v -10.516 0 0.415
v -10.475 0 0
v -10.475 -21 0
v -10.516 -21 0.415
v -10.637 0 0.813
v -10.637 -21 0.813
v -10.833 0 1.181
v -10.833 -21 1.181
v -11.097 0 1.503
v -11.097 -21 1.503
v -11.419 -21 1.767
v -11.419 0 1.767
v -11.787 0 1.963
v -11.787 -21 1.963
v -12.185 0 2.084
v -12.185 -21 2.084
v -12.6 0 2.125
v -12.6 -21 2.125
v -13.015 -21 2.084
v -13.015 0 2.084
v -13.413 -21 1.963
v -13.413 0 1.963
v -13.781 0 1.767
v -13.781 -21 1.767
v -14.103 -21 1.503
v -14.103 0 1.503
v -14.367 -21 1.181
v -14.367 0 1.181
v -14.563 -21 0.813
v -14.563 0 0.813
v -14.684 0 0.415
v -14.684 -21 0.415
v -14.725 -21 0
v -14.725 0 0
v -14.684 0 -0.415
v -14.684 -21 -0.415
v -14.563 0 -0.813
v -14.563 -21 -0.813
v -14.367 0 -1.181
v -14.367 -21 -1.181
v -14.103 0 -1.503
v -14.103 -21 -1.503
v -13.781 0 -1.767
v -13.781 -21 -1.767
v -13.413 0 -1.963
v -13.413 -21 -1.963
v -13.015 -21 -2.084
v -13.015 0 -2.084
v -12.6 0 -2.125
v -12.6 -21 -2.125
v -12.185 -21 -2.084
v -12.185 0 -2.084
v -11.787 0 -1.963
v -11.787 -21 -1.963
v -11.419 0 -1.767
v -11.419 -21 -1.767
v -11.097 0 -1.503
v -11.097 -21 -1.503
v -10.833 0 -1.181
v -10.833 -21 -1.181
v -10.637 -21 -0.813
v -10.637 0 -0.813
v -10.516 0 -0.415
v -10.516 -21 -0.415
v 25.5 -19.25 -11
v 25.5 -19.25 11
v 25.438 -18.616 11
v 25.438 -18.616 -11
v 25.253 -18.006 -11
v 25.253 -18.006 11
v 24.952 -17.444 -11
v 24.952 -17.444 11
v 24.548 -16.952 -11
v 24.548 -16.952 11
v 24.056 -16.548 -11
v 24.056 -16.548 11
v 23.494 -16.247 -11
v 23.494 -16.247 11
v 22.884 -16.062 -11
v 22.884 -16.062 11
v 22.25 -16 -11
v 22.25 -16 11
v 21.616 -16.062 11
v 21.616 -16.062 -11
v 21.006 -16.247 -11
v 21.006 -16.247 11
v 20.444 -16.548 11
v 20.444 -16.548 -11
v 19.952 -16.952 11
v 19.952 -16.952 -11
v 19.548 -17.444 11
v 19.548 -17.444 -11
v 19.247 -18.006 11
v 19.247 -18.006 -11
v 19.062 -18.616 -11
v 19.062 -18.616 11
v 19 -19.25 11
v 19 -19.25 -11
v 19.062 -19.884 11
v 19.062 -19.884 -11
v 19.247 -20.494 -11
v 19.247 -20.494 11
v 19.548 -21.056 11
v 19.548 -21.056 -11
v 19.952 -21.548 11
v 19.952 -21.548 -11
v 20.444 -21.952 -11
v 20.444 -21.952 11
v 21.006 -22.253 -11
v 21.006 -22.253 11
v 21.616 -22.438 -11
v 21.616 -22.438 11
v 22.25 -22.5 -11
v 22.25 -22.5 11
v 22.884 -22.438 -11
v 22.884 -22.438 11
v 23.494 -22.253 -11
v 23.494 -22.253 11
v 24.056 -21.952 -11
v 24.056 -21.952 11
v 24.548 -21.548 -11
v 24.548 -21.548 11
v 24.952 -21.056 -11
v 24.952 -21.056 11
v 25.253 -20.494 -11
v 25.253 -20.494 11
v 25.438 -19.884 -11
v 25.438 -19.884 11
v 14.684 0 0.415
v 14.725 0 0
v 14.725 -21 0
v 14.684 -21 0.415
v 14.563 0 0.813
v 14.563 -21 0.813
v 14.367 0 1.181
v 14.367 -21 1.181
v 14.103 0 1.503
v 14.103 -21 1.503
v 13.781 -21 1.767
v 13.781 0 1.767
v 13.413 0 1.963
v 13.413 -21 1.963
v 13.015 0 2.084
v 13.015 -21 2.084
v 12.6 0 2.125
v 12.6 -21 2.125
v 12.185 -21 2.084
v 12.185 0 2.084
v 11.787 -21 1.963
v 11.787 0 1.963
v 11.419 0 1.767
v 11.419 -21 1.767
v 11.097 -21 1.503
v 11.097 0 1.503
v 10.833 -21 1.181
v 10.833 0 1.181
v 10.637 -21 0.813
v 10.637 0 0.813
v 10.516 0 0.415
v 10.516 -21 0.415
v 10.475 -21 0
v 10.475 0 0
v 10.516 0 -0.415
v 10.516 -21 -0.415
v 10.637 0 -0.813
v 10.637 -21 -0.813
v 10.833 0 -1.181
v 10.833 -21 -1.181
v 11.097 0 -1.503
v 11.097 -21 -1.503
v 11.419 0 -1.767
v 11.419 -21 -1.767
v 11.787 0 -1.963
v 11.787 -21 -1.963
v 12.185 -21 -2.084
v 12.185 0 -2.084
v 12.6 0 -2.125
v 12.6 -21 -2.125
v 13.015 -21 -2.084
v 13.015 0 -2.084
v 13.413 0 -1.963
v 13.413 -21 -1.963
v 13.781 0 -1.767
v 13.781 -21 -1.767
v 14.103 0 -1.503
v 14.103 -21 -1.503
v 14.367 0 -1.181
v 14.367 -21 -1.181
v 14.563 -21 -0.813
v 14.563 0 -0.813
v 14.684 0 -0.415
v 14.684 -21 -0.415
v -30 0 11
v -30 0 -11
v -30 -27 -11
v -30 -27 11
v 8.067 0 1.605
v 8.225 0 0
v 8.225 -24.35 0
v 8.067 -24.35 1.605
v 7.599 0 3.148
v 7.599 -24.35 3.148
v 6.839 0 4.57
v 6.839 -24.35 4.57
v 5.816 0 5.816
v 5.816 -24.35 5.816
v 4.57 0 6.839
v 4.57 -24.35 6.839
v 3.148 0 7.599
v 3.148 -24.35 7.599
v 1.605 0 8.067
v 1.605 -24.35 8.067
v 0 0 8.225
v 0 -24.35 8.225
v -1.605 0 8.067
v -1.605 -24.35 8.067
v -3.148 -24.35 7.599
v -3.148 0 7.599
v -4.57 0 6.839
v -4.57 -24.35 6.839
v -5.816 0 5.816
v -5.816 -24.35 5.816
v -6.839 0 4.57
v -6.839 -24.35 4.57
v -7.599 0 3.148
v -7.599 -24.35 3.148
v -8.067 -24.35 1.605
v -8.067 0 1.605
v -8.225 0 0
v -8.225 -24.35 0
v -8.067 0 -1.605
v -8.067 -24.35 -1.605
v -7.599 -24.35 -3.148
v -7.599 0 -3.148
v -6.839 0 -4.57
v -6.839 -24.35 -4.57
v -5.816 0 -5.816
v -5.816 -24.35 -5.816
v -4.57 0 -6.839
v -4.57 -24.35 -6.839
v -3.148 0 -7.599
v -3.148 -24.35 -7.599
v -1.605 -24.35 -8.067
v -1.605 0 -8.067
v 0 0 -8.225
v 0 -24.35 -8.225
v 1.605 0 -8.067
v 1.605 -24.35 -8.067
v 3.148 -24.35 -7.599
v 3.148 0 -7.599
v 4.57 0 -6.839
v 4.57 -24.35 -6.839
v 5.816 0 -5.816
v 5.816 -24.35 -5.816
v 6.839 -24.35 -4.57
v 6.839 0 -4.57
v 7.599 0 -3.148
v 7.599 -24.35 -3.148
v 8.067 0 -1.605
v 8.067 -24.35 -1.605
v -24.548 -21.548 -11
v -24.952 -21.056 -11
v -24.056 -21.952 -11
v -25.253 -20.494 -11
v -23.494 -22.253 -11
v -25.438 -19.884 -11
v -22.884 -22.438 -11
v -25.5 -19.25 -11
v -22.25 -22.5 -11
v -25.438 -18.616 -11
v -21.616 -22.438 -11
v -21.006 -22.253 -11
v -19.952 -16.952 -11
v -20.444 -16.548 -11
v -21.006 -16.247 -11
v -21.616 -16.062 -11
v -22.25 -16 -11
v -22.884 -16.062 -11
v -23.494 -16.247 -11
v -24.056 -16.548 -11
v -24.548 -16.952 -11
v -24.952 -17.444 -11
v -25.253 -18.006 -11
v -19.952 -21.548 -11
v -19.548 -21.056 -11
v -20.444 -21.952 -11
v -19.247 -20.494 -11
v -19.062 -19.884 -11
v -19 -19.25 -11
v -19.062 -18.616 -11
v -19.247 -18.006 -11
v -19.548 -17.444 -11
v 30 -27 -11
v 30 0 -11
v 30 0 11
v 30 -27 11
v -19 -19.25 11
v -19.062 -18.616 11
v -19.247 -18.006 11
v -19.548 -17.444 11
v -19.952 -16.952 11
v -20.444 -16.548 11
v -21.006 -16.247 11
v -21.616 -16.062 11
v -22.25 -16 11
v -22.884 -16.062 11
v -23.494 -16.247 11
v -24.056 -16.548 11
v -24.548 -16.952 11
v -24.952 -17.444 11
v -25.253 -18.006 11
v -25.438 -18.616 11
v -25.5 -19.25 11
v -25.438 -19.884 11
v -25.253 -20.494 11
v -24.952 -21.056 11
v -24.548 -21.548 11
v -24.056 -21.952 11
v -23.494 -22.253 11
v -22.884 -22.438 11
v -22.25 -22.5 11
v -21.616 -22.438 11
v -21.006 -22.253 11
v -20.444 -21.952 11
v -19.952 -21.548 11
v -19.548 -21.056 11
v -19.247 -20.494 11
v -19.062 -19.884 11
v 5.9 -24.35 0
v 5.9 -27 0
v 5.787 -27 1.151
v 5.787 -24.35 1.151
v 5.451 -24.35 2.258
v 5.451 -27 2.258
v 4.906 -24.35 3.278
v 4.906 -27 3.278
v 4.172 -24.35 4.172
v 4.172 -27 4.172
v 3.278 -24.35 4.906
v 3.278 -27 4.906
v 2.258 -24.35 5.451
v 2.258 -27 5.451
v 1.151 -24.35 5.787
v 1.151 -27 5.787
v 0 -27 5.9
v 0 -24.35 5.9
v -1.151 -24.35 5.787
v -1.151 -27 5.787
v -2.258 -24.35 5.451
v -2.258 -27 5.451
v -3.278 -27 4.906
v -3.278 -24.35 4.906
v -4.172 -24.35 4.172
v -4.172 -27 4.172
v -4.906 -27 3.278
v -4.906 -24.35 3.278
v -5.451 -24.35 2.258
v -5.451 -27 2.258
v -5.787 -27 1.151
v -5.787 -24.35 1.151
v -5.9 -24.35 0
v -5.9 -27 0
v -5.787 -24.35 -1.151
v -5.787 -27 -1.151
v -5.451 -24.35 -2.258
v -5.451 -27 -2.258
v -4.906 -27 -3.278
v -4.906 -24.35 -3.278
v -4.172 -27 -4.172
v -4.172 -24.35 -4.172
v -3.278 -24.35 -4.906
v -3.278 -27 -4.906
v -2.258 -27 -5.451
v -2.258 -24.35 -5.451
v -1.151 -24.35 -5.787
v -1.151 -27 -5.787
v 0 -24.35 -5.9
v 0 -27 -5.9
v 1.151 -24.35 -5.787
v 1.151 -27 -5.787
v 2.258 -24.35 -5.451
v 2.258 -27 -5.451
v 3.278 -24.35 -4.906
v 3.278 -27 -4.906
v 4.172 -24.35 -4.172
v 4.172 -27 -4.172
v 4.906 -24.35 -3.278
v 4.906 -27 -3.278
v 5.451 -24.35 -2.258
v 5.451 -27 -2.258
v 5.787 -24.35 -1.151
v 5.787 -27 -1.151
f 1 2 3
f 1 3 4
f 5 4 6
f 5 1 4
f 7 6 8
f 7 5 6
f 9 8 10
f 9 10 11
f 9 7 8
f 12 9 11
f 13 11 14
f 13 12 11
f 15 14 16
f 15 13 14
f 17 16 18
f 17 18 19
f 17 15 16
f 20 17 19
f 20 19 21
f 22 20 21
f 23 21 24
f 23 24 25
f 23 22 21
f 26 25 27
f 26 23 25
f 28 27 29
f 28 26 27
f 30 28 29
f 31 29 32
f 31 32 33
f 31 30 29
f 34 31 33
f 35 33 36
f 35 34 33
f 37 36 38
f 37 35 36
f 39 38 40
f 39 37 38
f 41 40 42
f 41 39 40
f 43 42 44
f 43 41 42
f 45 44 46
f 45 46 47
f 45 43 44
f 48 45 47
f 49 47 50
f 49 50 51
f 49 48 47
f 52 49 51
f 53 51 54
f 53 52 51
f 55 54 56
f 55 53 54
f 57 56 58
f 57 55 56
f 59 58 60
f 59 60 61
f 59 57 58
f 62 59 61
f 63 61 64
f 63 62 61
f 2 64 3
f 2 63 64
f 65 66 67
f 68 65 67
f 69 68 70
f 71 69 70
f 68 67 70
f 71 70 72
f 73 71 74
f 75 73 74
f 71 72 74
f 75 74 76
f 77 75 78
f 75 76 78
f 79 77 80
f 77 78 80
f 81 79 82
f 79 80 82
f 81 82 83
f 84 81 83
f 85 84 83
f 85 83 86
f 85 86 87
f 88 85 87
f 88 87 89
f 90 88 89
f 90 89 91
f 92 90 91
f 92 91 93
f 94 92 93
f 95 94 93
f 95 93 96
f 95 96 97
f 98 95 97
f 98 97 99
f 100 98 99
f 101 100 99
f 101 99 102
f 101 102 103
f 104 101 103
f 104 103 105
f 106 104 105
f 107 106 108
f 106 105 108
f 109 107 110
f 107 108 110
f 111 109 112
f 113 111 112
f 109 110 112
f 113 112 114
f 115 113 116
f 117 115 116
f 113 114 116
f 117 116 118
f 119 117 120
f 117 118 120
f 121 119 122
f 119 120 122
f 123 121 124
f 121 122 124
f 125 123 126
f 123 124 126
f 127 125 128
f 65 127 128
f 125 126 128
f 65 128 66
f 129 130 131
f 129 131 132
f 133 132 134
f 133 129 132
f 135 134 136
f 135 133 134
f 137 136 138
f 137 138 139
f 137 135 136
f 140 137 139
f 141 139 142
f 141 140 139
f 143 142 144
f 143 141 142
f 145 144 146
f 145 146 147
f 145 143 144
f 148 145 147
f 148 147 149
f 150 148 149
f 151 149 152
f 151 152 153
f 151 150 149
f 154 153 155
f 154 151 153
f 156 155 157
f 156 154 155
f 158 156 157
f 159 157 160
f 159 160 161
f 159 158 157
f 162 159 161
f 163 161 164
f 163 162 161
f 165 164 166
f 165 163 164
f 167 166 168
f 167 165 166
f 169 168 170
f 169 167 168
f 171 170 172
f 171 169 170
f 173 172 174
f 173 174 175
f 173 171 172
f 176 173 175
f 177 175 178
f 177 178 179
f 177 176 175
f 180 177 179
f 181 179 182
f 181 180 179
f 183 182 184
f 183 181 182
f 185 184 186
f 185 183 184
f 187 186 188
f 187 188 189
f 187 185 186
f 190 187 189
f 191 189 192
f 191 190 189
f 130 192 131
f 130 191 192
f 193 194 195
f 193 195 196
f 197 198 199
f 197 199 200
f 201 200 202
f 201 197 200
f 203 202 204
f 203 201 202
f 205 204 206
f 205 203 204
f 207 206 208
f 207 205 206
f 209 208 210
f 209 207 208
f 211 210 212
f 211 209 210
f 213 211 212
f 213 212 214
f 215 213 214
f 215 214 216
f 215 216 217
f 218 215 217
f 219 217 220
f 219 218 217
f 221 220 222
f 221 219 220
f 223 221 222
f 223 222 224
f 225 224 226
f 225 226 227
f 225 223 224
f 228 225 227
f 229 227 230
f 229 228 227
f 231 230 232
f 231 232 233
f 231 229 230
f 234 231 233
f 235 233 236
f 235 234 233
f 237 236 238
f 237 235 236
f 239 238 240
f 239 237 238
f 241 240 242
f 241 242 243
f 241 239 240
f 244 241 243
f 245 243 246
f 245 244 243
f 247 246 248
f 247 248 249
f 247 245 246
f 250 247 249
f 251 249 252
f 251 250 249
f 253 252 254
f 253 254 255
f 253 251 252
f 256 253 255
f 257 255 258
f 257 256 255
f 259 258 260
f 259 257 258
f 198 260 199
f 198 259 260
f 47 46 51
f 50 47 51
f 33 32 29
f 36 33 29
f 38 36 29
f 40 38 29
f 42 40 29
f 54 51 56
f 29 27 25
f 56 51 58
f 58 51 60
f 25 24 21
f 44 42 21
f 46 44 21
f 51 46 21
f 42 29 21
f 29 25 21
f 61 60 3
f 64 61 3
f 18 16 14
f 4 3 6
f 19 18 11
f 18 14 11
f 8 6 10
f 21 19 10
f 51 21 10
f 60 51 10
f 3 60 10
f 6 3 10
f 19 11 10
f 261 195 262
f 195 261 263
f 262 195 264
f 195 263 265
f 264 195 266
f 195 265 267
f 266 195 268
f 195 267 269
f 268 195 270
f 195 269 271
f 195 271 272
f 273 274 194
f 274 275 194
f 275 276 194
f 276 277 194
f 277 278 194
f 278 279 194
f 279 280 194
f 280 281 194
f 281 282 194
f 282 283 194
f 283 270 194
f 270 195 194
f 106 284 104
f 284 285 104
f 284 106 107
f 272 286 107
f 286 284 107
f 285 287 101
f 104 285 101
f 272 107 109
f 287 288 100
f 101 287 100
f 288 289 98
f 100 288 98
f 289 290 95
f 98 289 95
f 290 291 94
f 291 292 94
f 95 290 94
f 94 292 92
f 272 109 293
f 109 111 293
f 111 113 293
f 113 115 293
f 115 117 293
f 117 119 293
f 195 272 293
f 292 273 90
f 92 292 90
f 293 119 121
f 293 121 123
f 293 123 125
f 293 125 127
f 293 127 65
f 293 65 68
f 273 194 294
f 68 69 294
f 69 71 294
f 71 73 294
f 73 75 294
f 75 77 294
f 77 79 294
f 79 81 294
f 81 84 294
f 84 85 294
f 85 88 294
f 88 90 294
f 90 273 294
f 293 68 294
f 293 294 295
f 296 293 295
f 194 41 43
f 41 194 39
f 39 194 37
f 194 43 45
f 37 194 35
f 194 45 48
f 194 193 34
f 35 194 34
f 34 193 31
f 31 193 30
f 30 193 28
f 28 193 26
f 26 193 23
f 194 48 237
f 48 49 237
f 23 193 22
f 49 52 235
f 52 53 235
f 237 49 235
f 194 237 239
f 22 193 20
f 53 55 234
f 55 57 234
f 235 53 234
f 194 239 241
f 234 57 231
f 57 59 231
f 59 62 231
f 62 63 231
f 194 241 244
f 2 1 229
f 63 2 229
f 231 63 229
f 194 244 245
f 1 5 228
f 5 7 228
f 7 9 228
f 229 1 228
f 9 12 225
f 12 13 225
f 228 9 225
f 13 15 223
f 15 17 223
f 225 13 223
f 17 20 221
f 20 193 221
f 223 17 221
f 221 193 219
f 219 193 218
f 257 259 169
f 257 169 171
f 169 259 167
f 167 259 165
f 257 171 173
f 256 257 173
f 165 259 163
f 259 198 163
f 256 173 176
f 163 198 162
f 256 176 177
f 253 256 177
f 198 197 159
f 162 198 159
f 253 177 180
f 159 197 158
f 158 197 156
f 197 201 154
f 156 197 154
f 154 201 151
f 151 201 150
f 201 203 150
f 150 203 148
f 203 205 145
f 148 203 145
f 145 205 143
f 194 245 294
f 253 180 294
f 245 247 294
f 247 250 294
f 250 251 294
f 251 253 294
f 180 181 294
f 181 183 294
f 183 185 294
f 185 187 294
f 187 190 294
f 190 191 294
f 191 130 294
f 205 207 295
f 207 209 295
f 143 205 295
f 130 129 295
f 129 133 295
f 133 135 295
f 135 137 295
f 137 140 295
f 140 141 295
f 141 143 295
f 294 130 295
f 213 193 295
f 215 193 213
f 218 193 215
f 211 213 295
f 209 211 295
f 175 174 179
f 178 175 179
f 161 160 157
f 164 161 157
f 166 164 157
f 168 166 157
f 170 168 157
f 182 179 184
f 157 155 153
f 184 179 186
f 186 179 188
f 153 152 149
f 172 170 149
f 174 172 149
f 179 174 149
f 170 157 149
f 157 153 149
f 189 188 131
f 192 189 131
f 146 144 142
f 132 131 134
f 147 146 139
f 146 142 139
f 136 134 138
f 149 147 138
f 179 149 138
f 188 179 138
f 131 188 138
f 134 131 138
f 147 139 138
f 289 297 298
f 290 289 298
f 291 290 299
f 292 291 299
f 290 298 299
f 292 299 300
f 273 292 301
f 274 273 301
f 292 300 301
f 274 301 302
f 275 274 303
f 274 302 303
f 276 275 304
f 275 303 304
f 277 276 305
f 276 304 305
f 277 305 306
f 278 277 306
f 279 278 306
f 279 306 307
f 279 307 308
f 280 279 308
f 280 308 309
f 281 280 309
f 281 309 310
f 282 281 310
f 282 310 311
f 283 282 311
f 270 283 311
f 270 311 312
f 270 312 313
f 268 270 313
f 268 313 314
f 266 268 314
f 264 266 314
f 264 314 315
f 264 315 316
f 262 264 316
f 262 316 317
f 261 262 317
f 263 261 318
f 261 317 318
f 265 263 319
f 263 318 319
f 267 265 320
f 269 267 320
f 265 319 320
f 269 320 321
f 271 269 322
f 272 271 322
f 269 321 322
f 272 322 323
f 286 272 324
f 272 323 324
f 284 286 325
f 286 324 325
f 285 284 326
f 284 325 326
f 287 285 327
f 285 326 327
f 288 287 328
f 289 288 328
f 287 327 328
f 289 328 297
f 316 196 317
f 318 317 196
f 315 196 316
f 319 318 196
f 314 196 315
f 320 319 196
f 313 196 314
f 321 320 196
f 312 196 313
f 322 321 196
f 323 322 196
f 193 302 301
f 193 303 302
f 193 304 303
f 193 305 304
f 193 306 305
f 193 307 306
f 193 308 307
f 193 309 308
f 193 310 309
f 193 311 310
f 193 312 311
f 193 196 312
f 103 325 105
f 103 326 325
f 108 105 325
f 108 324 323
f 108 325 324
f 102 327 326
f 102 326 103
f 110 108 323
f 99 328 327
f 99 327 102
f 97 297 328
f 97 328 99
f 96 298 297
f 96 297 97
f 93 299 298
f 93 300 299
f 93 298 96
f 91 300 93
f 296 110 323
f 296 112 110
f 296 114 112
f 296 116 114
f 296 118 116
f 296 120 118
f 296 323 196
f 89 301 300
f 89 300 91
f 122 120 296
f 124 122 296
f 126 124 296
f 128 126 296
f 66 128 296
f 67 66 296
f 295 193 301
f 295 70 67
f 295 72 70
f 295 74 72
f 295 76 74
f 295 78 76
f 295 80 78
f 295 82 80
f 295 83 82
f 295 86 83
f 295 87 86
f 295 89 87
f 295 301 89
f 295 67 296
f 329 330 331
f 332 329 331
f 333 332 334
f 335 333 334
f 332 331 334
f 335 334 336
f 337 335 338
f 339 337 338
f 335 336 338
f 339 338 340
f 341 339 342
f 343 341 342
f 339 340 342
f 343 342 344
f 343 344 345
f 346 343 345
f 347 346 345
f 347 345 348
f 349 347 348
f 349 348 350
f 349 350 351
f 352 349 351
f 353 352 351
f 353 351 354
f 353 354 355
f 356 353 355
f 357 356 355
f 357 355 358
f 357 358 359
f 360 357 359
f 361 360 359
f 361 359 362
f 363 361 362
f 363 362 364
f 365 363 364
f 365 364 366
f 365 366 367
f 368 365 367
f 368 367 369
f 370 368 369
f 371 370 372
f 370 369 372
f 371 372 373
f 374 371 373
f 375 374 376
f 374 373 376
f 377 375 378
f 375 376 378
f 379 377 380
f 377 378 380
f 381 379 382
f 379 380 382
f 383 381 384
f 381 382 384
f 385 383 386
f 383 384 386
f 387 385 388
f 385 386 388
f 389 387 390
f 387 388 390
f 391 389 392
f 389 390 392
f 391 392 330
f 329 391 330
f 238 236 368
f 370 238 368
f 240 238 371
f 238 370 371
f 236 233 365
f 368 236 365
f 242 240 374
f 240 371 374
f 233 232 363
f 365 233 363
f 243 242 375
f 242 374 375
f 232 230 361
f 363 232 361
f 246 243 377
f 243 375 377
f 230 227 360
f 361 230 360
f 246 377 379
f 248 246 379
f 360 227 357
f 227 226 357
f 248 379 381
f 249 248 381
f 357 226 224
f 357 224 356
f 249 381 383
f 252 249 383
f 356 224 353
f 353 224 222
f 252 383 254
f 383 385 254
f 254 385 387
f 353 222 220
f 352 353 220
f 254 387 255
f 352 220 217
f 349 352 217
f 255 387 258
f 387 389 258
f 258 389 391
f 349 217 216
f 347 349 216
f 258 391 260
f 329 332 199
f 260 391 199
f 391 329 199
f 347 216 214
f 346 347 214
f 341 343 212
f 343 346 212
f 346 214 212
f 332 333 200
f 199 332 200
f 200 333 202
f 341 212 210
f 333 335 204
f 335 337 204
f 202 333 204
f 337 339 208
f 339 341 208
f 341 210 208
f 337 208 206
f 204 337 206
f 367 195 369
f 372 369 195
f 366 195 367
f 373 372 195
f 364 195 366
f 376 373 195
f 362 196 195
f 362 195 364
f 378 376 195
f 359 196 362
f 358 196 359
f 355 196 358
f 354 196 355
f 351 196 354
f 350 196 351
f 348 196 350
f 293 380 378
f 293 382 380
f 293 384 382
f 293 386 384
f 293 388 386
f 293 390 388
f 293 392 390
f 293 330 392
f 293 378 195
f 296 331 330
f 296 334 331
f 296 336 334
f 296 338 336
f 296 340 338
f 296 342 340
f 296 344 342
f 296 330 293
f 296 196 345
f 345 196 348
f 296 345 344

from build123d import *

# Parameters (mm, degrees)
F0_W     = 60
F0_H     = 22
F0_R     = 2.125
F0_R_2   = 8.225
F1_DEPTH = 27
F2_DEPTH = 21
F3_R     = 3.25
F4_DEPTH = 22.001
F5_DEPTH = 24.35
F6_R     = 5.9
F7_DEPTH = 27.001


with BuildPart() as f1:
    # F0 (on Front) → F1 (new body)
    with BuildSketch(Plane.XZ):
        Rectangle(F0_W, F0_H)
        with Locations((-12.6, 0)):
            Circle(F0_R, mode=Mode.SUBTRACT)
        Circle(F0_R_2, mode=Mode.SUBTRACT)
        with Locations((12.6, 0)):
            Circle(F0_R, mode=Mode.SUBTRACT)
        Circle(F0_R_2)
        with Locations((-12.6, 0)):
            Circle(F0_R)
        with Locations((12.6, 0)):
            Circle(F0_R)
    extrude(amount=F1_DEPTH)

    # F0 (on Front) → F2 (cut)
    with BuildSketch(Plane.XZ):
        with Locations((12.6, 0)):
            Circle(F0_R)
        with Locations((-12.6, 0)):
            Circle(F0_R)
    extrude(amount=F2_DEPTH, mode=Mode.SUBTRACT)

    # F3 (on face) → F4 (cut, through all)
    with BuildSketch(Plane.XY.offset(11)):
        with Locations((22.25, -19.25)):
            Circle(F3_R)
        with Locations((-22.25, -19.25)):
            Circle(F3_R)
    extrude(amount=-F4_DEPTH, mode=Mode.SUBTRACT)

    # F0 (on Front) → F5 (cut)
    with BuildSketch(Plane.XZ):
        Circle(F0_R_2)
    extrude(amount=F5_DEPTH, mode=Mode.SUBTRACT)

    # F6 (on face) → F7 (cut, through all)
    with BuildSketch(Plane.XZ.offset(27)):
        Circle(F6_R)
    extrude(amount=-F7_DEPTH, mode=Mode.SUBTRACT)


solid = f1.part
